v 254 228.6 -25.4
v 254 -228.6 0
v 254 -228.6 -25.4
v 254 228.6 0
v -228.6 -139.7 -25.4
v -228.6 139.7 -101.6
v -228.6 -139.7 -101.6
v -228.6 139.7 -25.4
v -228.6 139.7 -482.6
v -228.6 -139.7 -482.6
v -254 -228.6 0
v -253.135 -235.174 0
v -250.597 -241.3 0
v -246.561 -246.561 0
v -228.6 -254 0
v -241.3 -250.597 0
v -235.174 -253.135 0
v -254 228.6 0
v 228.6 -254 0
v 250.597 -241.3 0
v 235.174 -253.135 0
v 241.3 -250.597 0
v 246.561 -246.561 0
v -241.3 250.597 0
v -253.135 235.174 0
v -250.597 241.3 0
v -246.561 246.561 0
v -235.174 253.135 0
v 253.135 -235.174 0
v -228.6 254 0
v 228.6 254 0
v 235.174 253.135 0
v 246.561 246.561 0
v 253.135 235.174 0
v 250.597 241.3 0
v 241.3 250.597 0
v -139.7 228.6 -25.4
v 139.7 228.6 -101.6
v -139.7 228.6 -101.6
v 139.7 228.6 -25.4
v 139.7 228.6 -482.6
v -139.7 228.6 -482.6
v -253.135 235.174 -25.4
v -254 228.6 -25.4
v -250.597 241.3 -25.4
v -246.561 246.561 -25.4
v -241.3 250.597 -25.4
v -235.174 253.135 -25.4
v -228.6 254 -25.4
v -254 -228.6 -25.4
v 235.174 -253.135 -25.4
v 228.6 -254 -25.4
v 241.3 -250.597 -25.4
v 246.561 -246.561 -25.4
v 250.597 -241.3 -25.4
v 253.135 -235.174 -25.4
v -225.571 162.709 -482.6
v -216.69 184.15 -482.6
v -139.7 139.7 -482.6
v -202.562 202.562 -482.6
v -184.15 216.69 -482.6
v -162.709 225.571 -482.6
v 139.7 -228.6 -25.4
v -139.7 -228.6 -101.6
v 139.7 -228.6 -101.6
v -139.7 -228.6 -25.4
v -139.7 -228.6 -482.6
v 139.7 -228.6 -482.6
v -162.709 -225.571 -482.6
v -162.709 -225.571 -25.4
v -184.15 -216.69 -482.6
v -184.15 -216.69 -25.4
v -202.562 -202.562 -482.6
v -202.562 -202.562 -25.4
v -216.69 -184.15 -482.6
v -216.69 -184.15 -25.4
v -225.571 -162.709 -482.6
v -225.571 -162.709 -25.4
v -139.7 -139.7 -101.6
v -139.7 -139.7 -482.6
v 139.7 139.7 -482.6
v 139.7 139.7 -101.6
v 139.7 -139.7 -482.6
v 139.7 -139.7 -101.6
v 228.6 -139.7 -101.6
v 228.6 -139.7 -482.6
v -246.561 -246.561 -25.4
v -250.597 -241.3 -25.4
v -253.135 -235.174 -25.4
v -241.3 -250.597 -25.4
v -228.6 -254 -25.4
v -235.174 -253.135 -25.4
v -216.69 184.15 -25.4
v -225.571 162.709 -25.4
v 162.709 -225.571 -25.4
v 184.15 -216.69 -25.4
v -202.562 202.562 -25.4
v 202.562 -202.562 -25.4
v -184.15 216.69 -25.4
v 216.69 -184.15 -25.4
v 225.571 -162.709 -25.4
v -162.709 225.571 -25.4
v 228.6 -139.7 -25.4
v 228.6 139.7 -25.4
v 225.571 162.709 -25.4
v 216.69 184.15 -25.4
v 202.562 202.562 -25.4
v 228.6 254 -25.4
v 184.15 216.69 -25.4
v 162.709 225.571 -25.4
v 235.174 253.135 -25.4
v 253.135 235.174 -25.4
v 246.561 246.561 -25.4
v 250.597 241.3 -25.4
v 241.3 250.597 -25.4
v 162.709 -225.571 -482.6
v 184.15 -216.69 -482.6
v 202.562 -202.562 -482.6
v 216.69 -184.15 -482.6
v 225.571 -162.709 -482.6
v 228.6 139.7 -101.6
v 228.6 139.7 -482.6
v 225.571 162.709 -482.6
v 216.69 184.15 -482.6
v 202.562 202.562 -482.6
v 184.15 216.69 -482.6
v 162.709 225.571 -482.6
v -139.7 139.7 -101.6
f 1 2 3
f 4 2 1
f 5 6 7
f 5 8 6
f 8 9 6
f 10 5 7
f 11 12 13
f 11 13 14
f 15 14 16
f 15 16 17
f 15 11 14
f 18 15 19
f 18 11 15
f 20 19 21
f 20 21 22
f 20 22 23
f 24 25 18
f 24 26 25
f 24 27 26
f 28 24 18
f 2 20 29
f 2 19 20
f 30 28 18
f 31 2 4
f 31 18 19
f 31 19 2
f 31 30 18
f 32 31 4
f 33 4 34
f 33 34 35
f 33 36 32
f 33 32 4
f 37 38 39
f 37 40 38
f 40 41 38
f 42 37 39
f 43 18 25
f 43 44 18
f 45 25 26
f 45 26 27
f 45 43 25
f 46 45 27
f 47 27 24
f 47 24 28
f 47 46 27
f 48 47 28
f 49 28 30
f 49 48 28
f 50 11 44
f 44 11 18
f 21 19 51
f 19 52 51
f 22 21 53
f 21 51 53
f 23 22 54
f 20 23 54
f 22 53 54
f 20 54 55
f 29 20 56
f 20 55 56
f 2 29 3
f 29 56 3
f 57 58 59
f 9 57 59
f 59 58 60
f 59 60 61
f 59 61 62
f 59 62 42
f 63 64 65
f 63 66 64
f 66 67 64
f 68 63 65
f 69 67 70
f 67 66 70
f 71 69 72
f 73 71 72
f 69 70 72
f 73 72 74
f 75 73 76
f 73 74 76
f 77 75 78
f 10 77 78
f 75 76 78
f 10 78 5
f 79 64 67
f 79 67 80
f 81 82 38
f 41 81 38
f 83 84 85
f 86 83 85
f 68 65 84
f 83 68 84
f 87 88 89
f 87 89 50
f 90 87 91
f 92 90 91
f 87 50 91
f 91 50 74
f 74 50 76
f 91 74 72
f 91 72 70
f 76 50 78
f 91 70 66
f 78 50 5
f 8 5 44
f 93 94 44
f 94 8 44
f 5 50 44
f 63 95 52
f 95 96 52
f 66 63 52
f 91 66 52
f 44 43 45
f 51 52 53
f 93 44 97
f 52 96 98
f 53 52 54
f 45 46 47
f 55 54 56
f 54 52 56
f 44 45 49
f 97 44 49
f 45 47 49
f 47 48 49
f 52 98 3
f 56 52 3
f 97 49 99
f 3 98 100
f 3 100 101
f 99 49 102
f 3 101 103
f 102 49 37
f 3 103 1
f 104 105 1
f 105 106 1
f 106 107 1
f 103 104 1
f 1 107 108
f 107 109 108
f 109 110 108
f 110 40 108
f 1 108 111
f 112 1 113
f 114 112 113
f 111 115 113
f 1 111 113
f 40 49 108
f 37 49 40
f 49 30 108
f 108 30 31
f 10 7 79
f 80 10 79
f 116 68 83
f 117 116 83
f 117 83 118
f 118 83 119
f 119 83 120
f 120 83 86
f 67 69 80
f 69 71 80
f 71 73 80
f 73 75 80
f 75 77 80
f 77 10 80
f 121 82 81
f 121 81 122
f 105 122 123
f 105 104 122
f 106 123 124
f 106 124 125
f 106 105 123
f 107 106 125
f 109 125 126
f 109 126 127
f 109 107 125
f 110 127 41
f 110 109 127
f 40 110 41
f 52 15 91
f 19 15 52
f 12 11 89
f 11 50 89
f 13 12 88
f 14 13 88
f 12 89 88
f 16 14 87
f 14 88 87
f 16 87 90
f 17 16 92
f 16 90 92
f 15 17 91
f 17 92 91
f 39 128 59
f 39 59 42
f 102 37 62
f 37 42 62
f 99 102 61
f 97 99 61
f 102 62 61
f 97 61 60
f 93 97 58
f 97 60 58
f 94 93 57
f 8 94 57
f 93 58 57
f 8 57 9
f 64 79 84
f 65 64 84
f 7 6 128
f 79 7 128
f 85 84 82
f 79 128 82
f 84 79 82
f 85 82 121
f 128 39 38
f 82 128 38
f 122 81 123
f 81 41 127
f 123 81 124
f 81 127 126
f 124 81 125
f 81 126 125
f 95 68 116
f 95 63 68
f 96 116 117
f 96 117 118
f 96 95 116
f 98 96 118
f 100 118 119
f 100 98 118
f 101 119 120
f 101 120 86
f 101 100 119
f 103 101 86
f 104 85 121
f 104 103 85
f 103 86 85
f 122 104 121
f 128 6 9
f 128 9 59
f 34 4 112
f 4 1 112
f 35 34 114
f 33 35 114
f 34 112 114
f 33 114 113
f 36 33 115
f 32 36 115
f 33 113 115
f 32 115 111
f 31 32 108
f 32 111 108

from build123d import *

# Parameters (mm, degrees)
F0_W     = 508
F0_H     = 508
F0_W_2   = 88.9
F0_H_2   = 88.9
F1_DEPTH = 25.4
F2_DEPTH = 101.6
F3_DEPTH = 482.6
F4_R     = 88.89999
F5_R     = 25.4


# Not quite as in the source:
# - a fillet or chamfer is up to 0.001 mm smaller than in the source, because OpenCascade refuses the exact size


with BuildPart() as f1:
    # F0 (on Top) → F1 (new body)
    with BuildSketch(Plane.XY):
        Rectangle(F0_W, F0_H)
        Polygon((139.7, 228.6), (228.6, 228.6), (228.6, 139.7), (228.6, -139.7), (228.6, -228.6), (139.7, -228.6), (-139.7, -228.6), (-228.6, -228.6), (-228.6, -139.7), (-228.6, 139.7), (-228.6, 228.6), (-139.7, 228.6), align=None, mode=Mode.SUBTRACT)
        with Locations((-184.15, -184.15)):
            Rectangle(F0_W_2, F0_H_2)
        with Locations((184.15, -184.15)):
            Rectangle(F0_W_2, F0_H_2)
        with Locations((184.15, 184.15)):
            Rectangle(F0_W_2, F0_H_2)
        with Locations((-184.15, 184.15)):
            Rectangle(F0_W_2, F0_H_2)
        Polygon((139.7, 139.7), (139.7, 228.6), (-139.7, 228.6), (-139.7, 139.7), (-228.6, 139.7), (-228.6, -139.7), (-139.7, -139.7), (-139.7, -228.6), (139.7, -228.6), (139.7, -139.7), (228.6, -139.7), (228.6, 139.7), align=None)
    extrude(amount=-F1_DEPTH)

    # F0 (on Top) → F2 (join)
    with BuildSketch(Plane.XY):
        with Locations((-184.15, 184.15)):
            Rectangle(F0_W_2, F0_H_2)
        Polygon((139.7, 139.7), (139.7, 228.6), (-139.7, 228.6), (-139.7, 139.7), (-228.6, 139.7), (-228.6, -139.7), (-139.7, -139.7), (-139.7, -228.6), (139.7, -228.6), (139.7, -139.7), (228.6, -139.7), (228.6, 139.7), align=None)
        with Locations((184.15, 184.15)):
            Rectangle(F0_W_2, F0_H_2)
        with Locations((184.15, -184.15)):
            Rectangle(F0_W_2, F0_H_2)
        with Locations((-184.15, -184.15)):
            Rectangle(F0_W_2, F0_H_2)
    extrude(amount=-F2_DEPTH)

    # F0 (on Top) → F3 (join)
    with BuildSketch(Plane.XY):
        with Locations((-184.15, 184.15)):
            Rectangle(F0_W_2, F0_H_2)
        with Locations((-184.15, -184.15)):
            Rectangle(F0_W_2, F0_H_2)
        with Locations((184.15, 184.15)):
            Rectangle(F0_W_2, F0_H_2)
        with Locations((184.15, -184.15)):
            Rectangle(F0_W_2, F0_H_2)
    extrude(amount=-F3_DEPTH)

    # F4 (radius 88.9 in the source; OpenCascade refuses exactly that, so slightly less here)
    f4_edges = [f1.edges().sort_by_distance(p)[0] for p in [
        (-228.6, -228.6, -254),
        (228.6, -228.6, -254),
        (228.6, 228.6, -254),
        (-228.6, 228.6, -254),
    ]]
    fillet(f4_edges, radius=F4_R)

    # F5
    f5_edges = [f1.edges().sort_by_distance(p)[0] for p in [
        (254, -254, -12.7),
        (254, 254, -12.7),
        (-254, 254, -12.7),
        (-254, -254, -12.7),
    ]]
    fillet(f5_edges, radius=F5_R)


solid = f1.part
